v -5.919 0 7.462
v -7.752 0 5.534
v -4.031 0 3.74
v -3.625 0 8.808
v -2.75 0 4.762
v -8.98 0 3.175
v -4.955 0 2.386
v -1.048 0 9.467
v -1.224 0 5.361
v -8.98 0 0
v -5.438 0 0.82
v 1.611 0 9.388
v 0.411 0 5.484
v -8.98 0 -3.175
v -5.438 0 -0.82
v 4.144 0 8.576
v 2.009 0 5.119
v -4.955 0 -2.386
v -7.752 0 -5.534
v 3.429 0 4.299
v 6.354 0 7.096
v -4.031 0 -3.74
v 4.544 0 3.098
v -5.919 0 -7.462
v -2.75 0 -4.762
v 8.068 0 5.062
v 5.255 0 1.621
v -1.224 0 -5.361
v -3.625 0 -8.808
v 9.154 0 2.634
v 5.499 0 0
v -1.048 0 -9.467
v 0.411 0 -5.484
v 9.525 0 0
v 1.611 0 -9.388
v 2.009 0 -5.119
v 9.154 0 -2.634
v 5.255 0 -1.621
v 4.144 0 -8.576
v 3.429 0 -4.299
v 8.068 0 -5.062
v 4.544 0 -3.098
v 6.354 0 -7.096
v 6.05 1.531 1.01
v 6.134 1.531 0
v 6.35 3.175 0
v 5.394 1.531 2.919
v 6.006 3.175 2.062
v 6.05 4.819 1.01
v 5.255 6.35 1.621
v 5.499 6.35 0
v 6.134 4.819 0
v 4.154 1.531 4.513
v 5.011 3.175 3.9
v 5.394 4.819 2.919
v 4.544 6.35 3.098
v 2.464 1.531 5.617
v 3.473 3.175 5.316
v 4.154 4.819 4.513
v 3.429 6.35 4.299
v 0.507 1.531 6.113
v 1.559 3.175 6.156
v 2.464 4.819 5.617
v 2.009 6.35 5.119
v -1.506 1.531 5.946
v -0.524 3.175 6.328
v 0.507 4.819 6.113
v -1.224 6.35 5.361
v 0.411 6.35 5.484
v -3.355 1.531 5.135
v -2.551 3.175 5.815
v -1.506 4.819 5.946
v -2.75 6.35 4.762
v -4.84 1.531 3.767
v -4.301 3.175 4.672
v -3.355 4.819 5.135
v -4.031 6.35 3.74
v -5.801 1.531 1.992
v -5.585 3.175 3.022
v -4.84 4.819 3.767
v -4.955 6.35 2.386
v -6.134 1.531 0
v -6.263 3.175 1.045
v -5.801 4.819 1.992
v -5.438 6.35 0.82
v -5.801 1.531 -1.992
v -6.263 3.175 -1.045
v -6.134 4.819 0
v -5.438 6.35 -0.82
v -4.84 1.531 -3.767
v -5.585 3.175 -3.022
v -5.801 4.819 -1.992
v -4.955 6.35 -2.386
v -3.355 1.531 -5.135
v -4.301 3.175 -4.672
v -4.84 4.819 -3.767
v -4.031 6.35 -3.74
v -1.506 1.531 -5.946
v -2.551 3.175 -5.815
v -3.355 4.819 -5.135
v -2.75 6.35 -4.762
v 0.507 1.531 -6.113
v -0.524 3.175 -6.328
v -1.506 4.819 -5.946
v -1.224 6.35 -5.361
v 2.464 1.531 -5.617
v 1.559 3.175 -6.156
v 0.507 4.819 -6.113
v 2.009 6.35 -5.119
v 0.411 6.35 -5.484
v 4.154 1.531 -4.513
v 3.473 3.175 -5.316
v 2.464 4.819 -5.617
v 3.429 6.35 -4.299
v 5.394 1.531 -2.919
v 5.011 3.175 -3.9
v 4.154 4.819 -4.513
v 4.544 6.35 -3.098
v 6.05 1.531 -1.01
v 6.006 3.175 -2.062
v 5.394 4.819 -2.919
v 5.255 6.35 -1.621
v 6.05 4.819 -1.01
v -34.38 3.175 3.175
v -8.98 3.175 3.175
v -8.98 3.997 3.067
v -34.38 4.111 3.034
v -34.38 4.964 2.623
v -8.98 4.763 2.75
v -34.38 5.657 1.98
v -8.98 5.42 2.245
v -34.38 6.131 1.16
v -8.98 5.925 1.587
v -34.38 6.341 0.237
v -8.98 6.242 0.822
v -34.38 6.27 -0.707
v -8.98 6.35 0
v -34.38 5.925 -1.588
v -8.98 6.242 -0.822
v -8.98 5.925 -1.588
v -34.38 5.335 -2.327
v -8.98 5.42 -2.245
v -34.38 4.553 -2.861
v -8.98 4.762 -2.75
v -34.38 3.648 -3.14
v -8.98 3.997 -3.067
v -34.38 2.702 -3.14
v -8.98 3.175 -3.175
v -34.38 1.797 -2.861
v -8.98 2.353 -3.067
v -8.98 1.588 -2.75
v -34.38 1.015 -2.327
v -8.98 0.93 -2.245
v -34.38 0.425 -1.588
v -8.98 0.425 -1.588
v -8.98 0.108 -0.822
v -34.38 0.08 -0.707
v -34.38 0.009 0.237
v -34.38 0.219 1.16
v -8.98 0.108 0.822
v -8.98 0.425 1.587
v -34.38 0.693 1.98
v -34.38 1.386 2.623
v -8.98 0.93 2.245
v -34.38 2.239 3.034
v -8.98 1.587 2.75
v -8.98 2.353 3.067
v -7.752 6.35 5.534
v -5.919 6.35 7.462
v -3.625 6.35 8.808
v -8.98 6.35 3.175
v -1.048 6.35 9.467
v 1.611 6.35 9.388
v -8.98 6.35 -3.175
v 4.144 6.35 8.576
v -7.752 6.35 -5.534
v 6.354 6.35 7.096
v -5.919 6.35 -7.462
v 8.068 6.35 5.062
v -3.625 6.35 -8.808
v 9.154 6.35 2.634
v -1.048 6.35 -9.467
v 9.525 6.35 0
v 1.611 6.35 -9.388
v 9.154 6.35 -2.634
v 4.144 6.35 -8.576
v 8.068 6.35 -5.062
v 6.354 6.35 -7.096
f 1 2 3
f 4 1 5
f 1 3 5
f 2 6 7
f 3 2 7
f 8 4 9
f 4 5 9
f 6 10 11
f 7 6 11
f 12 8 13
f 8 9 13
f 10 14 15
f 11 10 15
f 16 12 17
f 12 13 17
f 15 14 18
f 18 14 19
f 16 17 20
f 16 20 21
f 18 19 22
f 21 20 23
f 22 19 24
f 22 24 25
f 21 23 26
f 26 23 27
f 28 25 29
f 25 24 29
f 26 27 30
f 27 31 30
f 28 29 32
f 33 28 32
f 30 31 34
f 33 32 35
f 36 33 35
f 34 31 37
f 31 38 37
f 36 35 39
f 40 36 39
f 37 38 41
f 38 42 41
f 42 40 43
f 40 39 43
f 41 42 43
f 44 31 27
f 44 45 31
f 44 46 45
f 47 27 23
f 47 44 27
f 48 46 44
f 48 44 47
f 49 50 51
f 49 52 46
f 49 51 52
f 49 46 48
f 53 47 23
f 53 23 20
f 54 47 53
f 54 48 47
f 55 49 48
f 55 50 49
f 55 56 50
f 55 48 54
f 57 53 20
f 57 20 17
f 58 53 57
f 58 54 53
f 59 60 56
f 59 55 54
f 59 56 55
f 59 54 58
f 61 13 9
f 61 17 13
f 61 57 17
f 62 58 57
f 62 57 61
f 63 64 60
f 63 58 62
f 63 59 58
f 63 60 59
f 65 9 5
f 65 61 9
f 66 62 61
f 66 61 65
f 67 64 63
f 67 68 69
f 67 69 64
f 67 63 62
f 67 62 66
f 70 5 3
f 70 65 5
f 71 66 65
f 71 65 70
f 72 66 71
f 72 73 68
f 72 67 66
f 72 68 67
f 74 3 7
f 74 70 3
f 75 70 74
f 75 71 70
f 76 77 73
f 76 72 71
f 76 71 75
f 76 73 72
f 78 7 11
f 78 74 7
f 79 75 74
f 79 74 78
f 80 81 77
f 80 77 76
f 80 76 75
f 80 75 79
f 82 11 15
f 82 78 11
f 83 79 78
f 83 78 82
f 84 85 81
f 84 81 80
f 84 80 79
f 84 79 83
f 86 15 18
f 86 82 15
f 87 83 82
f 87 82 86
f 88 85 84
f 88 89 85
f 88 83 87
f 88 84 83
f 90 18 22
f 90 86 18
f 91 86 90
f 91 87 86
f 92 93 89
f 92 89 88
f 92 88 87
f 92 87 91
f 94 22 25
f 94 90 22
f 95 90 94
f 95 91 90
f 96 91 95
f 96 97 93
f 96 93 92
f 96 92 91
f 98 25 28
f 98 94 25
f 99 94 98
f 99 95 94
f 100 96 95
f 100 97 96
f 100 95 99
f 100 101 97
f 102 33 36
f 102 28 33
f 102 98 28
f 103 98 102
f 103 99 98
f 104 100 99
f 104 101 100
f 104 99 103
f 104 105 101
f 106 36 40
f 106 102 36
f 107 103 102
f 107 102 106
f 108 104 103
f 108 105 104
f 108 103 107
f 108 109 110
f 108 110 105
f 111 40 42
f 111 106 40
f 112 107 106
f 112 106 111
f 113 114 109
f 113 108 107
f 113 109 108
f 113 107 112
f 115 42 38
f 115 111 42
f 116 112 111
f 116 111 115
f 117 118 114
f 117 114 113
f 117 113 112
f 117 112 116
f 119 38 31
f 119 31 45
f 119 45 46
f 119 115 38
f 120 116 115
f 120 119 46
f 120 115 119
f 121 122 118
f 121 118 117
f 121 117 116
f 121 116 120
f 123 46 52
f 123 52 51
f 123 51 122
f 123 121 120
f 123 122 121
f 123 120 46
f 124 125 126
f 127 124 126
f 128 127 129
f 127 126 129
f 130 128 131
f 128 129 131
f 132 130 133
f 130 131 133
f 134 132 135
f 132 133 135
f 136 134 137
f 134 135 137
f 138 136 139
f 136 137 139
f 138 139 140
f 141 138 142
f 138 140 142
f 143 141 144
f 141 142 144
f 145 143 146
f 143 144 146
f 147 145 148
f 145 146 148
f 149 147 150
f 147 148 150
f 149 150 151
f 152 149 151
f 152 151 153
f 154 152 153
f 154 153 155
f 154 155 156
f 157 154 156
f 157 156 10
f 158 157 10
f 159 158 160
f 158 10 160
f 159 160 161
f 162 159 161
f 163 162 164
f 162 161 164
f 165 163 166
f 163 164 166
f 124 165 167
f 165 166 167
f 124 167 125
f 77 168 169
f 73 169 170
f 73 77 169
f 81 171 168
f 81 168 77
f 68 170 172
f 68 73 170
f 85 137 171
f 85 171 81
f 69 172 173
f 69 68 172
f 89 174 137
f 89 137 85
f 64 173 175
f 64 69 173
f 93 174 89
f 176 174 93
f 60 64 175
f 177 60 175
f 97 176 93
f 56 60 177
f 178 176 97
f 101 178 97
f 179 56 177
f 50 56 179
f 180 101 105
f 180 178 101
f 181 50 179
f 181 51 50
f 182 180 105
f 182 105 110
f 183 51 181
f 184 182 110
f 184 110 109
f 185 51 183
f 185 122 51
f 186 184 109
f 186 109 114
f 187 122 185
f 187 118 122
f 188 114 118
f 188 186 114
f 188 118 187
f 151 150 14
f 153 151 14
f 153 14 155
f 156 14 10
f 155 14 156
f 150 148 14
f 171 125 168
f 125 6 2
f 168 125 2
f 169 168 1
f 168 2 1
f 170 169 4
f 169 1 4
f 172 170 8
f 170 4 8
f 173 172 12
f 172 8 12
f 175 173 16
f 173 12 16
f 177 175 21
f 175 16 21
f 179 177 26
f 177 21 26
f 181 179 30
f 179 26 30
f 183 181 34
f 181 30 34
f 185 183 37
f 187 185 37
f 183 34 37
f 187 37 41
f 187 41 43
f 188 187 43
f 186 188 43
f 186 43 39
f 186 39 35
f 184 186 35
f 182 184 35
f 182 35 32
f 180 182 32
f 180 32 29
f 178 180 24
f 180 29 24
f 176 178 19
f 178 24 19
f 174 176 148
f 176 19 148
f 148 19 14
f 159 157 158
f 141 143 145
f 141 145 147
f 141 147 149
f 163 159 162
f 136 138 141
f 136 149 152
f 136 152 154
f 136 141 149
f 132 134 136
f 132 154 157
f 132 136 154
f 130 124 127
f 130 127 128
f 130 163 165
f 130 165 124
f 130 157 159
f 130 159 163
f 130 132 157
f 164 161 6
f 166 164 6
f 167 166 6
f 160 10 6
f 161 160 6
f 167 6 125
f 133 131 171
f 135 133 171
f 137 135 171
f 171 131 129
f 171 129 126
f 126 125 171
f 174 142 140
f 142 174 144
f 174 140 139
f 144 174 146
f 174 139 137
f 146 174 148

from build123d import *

# Parameters (mm, degrees)
BOSS_EXTRUDE1_DEPTH = 6.35
SKETCH2_R           = 3.175
BOSS_EXTRUDE2_DEPTH = 25.4


with BuildPart() as part:
    # Sketch1 → Boss-Extrude1 (new body)
    with BuildSketch(Plane(origin=(0, 0, 0), x_dir=(1, 0, 0), z_dir=(0, 1, 0))):
        with BuildLine():
            Line((-8.980256121, 3.175), (-8.980256121, -3.175))
            ThreePointArc((-8.980256121, -3.175), (9.525, 0), (-8.980256121, 3.175))
        make_face()
    extrude(amount=BOSS_EXTRUDE1_DEPTH)

    # Sketch2 → Boss-Extrude2 (add)
    with BuildSketch(Plane.ZY.offset(8.980256121)):
        with Locations((0, 3.175)):
            Circle(SKETCH2_R)
    extrude(amount=BOSS_EXTRUDE2_DEPTH)

    # Sketch3 → Cut-Revolve1 (revolve, cut)
    with BuildSketch(Plane.XY):
        with BuildLine():
            Line((0, 9.525), (0, -3.175))
            ThreePointArc((0, -3.175), (6.35, 3.175), (0, 9.525))
        make_face()
    revolve(axis=Axis((0, 6.35, 0), (0, -1, 0)), mode=Mode.SUBTRACT)


solid = part.part
